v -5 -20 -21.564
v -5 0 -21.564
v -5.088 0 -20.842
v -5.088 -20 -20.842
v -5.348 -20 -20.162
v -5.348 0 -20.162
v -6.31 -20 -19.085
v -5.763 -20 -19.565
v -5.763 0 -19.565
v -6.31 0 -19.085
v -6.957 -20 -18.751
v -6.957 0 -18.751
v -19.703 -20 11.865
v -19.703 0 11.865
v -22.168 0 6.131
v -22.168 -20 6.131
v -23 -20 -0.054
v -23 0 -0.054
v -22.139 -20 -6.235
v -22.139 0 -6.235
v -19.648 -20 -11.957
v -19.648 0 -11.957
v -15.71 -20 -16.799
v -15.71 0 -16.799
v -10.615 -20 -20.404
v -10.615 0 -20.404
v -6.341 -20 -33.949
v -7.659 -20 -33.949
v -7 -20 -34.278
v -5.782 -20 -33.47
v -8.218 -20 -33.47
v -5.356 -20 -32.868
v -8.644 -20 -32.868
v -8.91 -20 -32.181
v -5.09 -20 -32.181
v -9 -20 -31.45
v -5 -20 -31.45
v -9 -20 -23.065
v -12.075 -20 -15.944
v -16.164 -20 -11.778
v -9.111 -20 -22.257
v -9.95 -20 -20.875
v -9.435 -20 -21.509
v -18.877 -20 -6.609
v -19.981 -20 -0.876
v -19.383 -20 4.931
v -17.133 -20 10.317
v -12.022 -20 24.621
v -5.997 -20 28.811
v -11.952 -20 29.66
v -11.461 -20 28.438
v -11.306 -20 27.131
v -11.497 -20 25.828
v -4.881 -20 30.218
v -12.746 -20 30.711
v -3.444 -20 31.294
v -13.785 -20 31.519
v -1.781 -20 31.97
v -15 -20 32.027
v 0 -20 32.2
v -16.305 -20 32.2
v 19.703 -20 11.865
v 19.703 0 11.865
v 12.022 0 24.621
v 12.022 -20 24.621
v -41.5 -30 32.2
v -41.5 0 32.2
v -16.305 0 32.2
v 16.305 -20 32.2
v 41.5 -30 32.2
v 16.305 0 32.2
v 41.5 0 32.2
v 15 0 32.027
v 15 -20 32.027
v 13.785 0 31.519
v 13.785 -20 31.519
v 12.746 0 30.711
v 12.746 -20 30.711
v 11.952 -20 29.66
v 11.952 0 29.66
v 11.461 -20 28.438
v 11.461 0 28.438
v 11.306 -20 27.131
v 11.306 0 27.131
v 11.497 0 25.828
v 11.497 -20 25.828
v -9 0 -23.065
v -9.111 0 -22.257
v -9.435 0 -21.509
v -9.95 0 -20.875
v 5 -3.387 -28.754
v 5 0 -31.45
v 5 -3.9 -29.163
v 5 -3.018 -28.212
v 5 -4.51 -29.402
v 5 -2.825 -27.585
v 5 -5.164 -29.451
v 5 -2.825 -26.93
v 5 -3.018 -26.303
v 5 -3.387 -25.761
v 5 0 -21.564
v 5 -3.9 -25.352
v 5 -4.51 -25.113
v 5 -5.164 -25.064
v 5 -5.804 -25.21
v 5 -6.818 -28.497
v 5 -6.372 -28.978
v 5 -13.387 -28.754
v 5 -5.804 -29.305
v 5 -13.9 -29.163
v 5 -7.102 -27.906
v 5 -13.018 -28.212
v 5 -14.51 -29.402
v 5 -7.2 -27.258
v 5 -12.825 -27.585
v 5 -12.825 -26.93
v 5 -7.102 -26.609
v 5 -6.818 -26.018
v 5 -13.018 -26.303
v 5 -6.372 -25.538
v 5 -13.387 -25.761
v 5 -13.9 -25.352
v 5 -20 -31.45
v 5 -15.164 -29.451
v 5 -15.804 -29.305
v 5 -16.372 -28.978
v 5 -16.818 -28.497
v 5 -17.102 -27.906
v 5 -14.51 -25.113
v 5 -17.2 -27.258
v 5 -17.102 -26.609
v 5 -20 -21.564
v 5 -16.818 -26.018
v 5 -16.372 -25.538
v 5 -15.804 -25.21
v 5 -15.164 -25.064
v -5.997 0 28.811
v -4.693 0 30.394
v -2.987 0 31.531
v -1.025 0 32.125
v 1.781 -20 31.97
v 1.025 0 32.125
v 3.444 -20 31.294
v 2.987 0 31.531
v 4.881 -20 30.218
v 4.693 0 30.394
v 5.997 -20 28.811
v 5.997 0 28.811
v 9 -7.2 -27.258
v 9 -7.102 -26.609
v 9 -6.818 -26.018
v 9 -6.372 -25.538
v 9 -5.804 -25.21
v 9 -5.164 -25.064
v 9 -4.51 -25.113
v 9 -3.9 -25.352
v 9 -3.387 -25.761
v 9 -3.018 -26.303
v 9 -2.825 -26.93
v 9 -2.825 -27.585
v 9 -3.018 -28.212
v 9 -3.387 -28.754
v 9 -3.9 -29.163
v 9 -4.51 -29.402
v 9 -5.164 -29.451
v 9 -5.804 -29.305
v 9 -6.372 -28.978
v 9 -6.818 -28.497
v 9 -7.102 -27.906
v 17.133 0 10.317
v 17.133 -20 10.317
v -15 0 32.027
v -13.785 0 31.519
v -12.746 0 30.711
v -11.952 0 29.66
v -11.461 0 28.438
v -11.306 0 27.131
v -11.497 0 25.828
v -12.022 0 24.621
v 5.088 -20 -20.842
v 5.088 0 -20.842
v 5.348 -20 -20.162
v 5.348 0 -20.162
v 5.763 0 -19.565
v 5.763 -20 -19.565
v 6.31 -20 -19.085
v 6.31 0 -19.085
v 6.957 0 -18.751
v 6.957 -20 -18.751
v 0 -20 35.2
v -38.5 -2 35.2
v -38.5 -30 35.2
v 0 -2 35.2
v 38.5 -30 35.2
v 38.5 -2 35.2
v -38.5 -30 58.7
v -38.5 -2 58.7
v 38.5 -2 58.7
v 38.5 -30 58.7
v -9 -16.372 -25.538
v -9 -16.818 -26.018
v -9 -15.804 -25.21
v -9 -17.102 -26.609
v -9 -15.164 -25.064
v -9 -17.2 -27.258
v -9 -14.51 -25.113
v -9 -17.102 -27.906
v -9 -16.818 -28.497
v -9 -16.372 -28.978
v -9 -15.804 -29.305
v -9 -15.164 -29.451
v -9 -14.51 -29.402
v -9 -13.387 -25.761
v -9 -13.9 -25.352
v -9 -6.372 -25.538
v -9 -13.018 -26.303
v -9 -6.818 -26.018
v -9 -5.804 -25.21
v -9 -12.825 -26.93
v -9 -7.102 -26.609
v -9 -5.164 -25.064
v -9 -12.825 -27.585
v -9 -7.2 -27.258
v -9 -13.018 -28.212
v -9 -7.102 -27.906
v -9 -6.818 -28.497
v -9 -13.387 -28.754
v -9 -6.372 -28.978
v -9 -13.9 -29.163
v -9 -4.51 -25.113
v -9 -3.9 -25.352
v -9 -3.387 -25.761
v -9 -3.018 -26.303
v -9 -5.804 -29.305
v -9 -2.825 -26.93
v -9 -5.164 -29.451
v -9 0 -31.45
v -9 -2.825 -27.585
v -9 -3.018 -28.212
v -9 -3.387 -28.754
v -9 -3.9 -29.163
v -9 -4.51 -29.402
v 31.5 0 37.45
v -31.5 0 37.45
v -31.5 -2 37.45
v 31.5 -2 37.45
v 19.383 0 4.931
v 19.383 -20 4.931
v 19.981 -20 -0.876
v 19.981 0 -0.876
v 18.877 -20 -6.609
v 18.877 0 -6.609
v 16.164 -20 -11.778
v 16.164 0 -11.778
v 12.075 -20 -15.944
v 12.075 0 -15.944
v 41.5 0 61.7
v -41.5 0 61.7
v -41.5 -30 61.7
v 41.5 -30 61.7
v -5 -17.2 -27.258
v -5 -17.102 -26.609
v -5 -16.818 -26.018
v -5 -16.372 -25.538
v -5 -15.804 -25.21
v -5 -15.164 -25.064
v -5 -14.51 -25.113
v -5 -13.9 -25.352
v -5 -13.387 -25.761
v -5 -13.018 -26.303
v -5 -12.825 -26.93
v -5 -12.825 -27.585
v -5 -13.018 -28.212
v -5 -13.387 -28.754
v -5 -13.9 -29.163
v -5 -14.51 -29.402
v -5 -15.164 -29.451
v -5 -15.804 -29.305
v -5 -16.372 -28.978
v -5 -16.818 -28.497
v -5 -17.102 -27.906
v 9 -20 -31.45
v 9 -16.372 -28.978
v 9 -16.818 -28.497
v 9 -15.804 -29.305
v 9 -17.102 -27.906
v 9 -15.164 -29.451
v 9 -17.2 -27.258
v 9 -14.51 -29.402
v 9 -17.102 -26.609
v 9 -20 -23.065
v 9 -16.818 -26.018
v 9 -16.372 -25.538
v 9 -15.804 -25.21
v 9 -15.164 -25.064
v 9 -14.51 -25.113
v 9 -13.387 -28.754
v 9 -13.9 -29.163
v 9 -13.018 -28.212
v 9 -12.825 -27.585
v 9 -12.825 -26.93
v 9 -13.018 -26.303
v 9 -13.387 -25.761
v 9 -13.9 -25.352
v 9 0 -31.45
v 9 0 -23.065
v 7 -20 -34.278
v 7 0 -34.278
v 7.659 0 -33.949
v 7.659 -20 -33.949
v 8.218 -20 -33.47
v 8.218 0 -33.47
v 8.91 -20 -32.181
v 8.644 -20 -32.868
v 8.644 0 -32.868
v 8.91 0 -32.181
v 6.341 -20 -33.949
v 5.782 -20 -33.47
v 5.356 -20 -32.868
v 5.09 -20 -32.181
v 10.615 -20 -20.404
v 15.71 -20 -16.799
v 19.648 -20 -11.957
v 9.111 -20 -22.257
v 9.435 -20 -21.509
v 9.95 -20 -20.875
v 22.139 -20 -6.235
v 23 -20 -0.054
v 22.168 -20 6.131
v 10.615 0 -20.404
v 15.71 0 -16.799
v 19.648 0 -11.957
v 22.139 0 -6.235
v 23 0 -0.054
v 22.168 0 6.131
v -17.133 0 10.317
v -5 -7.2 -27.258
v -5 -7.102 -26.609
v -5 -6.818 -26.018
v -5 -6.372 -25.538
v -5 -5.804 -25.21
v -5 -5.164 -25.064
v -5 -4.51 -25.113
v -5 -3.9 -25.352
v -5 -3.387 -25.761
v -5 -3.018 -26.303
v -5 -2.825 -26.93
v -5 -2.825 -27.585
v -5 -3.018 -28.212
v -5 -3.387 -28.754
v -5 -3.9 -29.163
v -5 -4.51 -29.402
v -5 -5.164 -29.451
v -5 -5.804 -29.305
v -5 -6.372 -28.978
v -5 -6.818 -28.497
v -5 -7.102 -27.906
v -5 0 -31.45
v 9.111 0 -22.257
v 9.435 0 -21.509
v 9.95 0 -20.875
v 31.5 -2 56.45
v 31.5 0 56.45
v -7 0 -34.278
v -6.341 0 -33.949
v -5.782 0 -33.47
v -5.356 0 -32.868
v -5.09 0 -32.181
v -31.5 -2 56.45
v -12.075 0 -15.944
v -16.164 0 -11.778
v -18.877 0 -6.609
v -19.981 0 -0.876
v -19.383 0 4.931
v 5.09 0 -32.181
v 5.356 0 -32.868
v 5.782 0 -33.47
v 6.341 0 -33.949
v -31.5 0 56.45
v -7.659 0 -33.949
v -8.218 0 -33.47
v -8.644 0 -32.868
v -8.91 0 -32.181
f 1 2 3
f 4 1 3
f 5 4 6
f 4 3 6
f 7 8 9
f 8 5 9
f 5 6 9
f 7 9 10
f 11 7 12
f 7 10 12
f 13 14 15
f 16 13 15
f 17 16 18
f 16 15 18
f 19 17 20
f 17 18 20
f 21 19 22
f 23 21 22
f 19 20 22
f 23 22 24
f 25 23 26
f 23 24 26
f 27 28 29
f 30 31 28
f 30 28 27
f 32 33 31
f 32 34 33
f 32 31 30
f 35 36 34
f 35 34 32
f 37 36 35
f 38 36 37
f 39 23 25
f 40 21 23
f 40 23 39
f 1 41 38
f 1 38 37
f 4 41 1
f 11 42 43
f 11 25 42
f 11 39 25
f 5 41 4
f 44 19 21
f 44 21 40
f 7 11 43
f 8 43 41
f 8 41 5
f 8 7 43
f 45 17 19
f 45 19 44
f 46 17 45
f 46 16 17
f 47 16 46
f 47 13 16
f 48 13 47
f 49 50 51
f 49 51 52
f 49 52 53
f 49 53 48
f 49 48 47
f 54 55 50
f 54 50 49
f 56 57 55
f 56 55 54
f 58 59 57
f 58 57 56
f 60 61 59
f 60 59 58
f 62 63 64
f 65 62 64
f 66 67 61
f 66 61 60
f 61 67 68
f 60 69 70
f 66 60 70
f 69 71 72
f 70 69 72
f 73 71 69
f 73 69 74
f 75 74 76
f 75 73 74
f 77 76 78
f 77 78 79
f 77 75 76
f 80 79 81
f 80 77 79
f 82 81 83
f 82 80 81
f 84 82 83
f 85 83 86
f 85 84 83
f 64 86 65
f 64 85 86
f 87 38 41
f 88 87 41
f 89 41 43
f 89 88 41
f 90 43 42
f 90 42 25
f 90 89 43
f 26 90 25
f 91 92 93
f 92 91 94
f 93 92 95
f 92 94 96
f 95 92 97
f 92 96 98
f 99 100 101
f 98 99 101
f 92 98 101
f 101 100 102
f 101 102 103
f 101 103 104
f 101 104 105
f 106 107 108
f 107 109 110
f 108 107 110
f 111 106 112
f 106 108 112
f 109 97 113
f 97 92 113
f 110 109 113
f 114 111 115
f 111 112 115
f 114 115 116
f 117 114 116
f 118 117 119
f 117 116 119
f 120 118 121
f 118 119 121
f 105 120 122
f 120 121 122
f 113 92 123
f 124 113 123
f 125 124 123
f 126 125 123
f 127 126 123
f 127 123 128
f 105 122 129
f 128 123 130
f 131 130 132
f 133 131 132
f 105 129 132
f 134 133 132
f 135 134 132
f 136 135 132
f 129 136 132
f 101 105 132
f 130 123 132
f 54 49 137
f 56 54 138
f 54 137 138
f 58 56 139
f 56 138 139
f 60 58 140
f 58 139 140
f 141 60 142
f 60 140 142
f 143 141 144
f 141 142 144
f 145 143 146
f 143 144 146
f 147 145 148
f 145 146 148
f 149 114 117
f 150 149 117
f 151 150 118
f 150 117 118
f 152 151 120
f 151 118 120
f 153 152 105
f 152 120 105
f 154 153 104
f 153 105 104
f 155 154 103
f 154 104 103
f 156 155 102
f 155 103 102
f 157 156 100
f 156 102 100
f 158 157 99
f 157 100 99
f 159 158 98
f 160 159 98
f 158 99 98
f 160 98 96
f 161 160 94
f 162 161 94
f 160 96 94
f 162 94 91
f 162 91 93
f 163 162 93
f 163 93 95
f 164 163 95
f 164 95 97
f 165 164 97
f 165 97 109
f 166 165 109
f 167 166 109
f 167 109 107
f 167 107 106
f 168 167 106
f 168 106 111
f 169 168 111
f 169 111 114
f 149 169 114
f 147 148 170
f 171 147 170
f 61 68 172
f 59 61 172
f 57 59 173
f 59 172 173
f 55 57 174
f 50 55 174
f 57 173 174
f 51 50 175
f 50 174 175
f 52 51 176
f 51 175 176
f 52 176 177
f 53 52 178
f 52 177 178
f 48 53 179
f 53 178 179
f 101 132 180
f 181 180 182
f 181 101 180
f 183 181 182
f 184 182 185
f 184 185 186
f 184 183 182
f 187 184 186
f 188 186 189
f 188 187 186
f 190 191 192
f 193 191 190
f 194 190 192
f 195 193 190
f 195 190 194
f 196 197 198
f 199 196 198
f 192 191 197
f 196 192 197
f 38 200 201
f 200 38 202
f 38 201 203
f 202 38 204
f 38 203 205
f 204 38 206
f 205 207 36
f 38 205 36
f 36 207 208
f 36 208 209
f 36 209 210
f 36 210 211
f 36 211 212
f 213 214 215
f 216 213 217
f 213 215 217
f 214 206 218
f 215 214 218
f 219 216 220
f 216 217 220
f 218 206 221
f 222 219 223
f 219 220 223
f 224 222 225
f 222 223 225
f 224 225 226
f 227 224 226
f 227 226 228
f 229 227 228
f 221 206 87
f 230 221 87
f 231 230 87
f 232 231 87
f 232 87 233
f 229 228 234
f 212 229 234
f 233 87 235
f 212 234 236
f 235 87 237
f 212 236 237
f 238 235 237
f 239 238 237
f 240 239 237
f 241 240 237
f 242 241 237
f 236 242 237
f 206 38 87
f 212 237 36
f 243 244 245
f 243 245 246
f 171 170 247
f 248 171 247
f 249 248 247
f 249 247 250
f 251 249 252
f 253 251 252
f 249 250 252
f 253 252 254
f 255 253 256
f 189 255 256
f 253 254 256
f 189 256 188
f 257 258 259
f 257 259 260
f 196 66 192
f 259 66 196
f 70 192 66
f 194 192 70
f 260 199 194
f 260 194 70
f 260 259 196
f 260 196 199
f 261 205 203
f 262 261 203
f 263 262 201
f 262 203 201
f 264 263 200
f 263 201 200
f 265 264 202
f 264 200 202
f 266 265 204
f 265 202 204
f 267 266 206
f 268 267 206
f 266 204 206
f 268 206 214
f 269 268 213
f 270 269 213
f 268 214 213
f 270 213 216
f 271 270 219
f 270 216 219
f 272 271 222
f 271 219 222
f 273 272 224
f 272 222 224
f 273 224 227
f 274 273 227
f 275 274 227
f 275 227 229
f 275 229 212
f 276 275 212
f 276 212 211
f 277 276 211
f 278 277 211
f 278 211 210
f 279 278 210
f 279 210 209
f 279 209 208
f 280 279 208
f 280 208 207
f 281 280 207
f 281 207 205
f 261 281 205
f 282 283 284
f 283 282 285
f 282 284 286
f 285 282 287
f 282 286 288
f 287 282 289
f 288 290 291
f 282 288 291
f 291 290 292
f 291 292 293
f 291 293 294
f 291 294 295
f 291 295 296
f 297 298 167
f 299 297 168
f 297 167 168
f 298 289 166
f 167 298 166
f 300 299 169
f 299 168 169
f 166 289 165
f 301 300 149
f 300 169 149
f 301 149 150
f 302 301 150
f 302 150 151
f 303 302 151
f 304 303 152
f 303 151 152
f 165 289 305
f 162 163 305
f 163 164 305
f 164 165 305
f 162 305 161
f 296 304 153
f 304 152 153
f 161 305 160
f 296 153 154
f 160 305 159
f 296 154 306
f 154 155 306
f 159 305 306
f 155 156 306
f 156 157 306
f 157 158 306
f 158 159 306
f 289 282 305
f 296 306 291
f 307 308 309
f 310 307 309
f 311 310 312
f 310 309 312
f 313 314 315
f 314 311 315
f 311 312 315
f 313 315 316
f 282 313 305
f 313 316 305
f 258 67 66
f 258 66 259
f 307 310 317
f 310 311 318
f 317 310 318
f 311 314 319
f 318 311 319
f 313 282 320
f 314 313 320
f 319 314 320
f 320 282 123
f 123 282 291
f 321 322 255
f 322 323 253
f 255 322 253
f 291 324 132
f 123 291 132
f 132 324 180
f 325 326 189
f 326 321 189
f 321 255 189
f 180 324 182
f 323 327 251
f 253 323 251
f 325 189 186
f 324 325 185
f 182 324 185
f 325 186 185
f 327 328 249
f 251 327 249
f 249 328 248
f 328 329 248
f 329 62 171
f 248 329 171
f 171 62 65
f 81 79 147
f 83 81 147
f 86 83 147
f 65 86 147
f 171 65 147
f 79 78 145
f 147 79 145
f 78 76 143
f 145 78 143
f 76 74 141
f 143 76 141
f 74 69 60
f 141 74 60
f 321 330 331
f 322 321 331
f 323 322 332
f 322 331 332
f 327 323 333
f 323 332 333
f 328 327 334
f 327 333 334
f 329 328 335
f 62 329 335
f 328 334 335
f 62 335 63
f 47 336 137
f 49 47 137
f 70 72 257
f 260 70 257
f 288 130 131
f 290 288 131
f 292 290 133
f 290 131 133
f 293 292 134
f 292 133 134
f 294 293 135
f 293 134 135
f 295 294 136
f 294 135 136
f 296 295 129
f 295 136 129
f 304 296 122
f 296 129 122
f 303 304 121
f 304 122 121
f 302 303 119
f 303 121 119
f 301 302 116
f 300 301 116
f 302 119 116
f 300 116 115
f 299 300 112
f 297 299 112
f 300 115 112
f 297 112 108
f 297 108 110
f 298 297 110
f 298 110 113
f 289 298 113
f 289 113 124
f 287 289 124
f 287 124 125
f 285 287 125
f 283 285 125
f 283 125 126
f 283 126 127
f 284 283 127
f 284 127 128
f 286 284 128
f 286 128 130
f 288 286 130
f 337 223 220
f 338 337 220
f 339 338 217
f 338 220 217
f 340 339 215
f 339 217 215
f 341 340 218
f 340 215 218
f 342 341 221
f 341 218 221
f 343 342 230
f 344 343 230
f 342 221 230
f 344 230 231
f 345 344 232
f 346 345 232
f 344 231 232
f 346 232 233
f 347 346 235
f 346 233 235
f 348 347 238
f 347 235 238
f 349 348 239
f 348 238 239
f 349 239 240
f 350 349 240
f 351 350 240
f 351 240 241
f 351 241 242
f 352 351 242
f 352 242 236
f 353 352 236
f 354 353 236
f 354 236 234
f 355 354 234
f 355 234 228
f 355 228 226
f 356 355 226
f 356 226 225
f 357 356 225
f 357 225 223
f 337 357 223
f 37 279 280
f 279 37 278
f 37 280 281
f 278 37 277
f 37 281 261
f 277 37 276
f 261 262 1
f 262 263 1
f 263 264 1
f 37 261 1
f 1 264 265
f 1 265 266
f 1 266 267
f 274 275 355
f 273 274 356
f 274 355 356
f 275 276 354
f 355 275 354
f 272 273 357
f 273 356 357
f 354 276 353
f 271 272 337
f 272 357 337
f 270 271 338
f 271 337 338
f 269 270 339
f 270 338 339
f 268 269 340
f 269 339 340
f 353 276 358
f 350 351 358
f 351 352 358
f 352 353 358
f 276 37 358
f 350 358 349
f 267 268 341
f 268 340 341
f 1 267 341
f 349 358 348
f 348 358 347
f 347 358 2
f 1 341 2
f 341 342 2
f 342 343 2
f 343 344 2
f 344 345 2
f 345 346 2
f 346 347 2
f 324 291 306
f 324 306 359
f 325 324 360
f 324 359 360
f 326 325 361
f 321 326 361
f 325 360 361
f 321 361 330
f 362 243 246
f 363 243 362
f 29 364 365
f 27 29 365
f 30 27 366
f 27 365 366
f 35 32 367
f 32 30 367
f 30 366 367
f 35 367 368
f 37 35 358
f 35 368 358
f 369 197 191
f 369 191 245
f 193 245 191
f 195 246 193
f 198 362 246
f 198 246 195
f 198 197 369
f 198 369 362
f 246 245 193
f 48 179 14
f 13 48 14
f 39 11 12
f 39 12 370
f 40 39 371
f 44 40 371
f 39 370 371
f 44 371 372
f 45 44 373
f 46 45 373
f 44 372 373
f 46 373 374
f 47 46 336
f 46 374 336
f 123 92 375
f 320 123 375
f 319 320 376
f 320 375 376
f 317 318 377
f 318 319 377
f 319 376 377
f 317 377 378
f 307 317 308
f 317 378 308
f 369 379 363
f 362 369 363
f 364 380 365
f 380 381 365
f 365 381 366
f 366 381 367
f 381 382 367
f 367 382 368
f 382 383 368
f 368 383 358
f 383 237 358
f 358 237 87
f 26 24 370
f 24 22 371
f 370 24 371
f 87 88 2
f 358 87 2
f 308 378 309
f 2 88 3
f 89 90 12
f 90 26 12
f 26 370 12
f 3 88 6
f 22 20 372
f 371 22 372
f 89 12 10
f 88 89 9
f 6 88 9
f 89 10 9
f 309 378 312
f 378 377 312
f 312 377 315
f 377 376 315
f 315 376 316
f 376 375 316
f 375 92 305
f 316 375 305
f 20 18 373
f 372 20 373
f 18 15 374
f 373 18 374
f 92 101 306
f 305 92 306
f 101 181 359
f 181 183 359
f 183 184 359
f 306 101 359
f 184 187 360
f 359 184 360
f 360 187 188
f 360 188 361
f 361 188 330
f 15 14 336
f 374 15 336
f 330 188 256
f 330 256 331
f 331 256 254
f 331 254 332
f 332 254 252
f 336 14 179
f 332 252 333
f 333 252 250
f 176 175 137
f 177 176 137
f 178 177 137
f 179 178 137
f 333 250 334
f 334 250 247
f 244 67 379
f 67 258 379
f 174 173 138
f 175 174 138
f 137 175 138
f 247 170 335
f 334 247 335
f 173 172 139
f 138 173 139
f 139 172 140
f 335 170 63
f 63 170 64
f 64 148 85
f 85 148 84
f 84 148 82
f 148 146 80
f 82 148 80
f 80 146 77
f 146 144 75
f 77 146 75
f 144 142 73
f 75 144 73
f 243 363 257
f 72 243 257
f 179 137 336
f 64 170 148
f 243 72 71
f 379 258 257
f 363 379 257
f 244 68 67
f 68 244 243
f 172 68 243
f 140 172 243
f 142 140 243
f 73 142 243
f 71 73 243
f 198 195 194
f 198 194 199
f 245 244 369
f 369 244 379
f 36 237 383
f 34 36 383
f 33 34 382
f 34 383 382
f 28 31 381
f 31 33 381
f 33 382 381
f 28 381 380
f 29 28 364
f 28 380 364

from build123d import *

# Parameters (mm, degrees)
F1_DEPTH    = 20
F3_DEPTH    = 20.001
F5_DEPTH    = 20
F6_T1_DEPTH = 20
F6_T3_DEPTH = 30.9947096091
F6_T5_DEPTH = 35
F7_W        = 83
F7_H        = 29.5
F7_W_2      = 77
F7_H_2      = 23.5
F8_DEPTH    = 30
F9_T1_DEPTH = 20
F10_R       = 2.2
F11_DEPTH   = 50.501
F12_W       = 77
F12_H       = 23.5
F12_W_2     = 63
F12_H_2     = 19
F13_DEPTH   = 2


# Not quite as in the source:
# - a fillet or chamfer that OpenCascade refuses, or shapes differently, is made with other operations: its cross-section is extruded or revolved along the edge and cut away or added


with BuildPart() as f1:
    # F0 (on Front) → F1 (new body)
    with BuildSketch(Plane.XZ):
        with BuildLine():
            ThreePointArc((8.5666506378, 30.3587301587), (0, 35.2), (-8.5666506378, 30.3587301587))
            Line((-8.5666506378, 30.3587301587), (-19.7032964668, 11.8650793651))
            ThreePointArc((-19.7032964668, 11.8650793651), (0, -23), (19.7032964668, 11.8650793651))
            Line((19.7032964668, 11.8650793651), (8.5666506378, 30.3587301587))
        make_face()
        with BuildLine():
            ThreePointArc((17.1333012755, 10.3174603175), (0, -20), (-17.1333012755, 10.3174603175))
            Line((-17.1333012755, 10.3174603175), (-5.9966554464, 28.8111111111))
            ThreePointArc((-5.9966554464, 28.8111111111), (0, 32.2), (5.9966554464, 28.8111111111))
            Line((5.9966554464, 28.8111111111), (17.1333012755, 10.3174603175))
        make_face(mode=Mode.SUBTRACT)
    extrude(amount=F1_DEPTH)

    # F2 (on face) → F3 (cut, through all)
    with BuildSketch(Plane.XZ.offset(20)):
        with BuildLine():
            ThreePointArc((5, -19.364916731), (0, -20), (-5, -19.364916731))
            Line((-5, -19.364916731), (-5, -22.4499443206))
            ThreePointArc((-5, -22.4499443206), (0, -23), (5, -22.4499443206))
            Line((5, -22.4499443206), (5, -19.364916731))
        make_face()
    extrude(amount=-F3_DEPTH, mode=Mode.SUBTRACT)

    # F4 (on Front) → F5 (join, through all)
    with BuildSketch(Plane.XZ):
        Polygon((-5, -34.4499443206), (-5, -22.4499443206), (-9, -21.1660104885), (-9, -34.4499443206), align=None)
        Polygon((5, -34.4499443206), (9, -34.4499443206), (9, -21.1660104885), (5, -22.4499443206), align=None)
    extrude(amount=F5_DEPTH)

    # F6: fillet of radius 3 on 8 edges, made by hand

    # F6_s2 → F6_t1 (join)
    with BuildSketch(Plane.XZ):
        with BuildLine():
            ThreePointArc((-9, -23.0651251893), (-9.4354487572, -21.5085016244), (-10.6153846154, -20.4037645906))
            ThreePointArc((-10.6153846154, -20.4037645906), (-9.8150946559, -20.8005749174), (-9, -21.1660104885))
            Line((-9, -21.1660104885), (-9, -23.0651251893))
        make_face()
        with BuildLine():
            ThreePointArc((9, -23.0651251893), (9.4354487572, -21.5085016244), (10.6153846154, -20.4037645906))
            ThreePointArc((10.6153846154, -20.4037645906), (9.8150946559, -20.8005749174), (9, -21.1660104885))
            Line((9, -21.1660104885), (9, -23.0651251893))
        make_face()
    extrude(amount=F6_T1_DEPTH)

    # F6_s4 → F6_t3 (cut)
    with BuildSketch(Plane.XZ.offset(-5.4973548045)):
        with BuildLine():
            ThreePointArc((-5, -21.5638586528), (-5.5372337928, -19.8507379307), (-6.9565217391, -18.7511814373))
            ThreePointArc((-6.9565217391, -18.7511814373), (-5.9861315369, -19.0831399204), (-5, -19.364916731))
            Line((-5, -19.364916731), (-5, -21.5638586528))
        make_face()
        with BuildLine():
            ThreePointArc((5, -21.5638586528), (5.5372337928, -19.8507379307), (6.9565217391, -18.7511814373))
            ThreePointArc((6.9565217391, -18.7511814373), (5.9861315369, -19.0831399204), (5, -19.364916731))
            Line((5, -19.364916731), (5, -21.5638586528))
        make_face()
    extrude(amount=F6_T3_DEPTH, mode=Mode.SUBTRACT)

    # F6_s6 → F6_t5 (cut)
    with BuildSketch(Plane.XZ.offset(-7.5)):
        with BuildLine():
            ThreePointArc((-8, -34.4499443206), (-5.8786796564, -33.5712646642), (-5, -31.4499443206))
            Line((-5, -31.4499443206), (-5, -34.4499443206))
            Line((-5, -34.4499443206), (-8, -34.4499443206))
        make_face()
        with BuildLine():
            ThreePointArc((5, -31.4499443206), (5.8786796564, -33.5712646642), (8, -34.4499443206))
            Line((8, -34.4499443206), (5, -34.4499443206))
            Line((5, -34.4499443206), (5, -31.4499443206))
        make_face()
        with BuildLine():
            ThreePointArc((6, -34.4499443206), (8.1213203436, -33.5712646642), (9, -31.4499443206))
            Line((9, -31.4499443206), (9, -34.4499443206))
            Line((9, -34.4499443206), (6, -34.4499443206))
        make_face()
        with BuildLine():
            ThreePointArc((-9, -31.4499443206), (-8.1213203436, -33.5712646642), (-6, -34.4499443206))
            Line((-6, -34.4499443206), (-9, -34.4499443206))
            Line((-9, -34.4499443206), (-9, -31.4499443206))
        make_face()
    extrude(amount=F6_T5_DEPTH, mode=Mode.SUBTRACT)

    # F7 (on Front) → F8 (join)
    with BuildSketch(Plane.XZ):
        with Locations((0, 46.95)):
            Rectangle(F7_W, F7_H)
        with Locations((0, 46.95)):
            Rectangle(F7_W_2, F7_H_2, mode=Mode.SUBTRACT)
    extrude(amount=F8_DEPTH)

    # F9: fillet of radius 5 on 2 edges, made by hand

    # F9_s2 → F9_t1 (join)
    with BuildSketch(Plane.XZ):
        with BuildLine():
            ThreePointArc((-16.3053853354, 32.2), (-11.9524078833, 29.659997419), (-12.0220600165, 24.6206349206))
            Line((-12.0220600165, 24.6206349206), (-11.5937274846, 24.3626984127))
            ThreePointArc((-11.5937274846, 24.3626984127), (-8.1383181059, 30.1007936508), (-6.7843570071, 31.85))
            Line((-6.7843570071, 31.85), (-7.1414284285, 32.7))
            Line((-7.1414284285, 32.7), (-16.3053853354, 32.7))
            Line((-16.3053853354, 32.7), (-16.3053853354, 32.2))
        make_face()
        with BuildLine():
            ThreePointArc((16.3053853354, 32.2), (11.9524078833, 29.659997419), (12.0220600165, 24.6206349206))
            Line((12.0220600165, 24.6206349206), (11.5937274846, 24.3626984127))
            ThreePointArc((11.5937274846, 24.3626984127), (8.1383181059, 30.1007936508), (6.7843570071, 31.85))
            Line((6.7843570071, 31.85), (7.1414284285, 32.7))
            Line((7.1414284285, 32.7), (16.3053853354, 32.7))
            Line((16.3053853354, 32.7), (16.3053853354, 32.2))
        make_face()
    extrude(amount=F9_T1_DEPTH)

    # F10 (on face) → F11 (cut, through all)
    with BuildSketch(Plane(origin=(-9, 0, 0), x_dir=(0, -1, 0), z_dir=(-1, 0, 0))):
        with Locations((5, -27.257534755)):
            Circle(F10_R)
        with Locations((15, -27.257534755)):
            Circle(F10_R)
    extrude(amount=-F11_DEPTH, mode=Mode.SUBTRACT)

    # F12 (on Front) → F13 (join)
    with BuildSketch(Plane.XZ):
        with Locations((0, 46.95)):
            Rectangle(F12_W, F12_H)
        with Locations((0, 46.95)):
            Rectangle(F12_W_2, F12_H_2, mode=Mode.SUBTRACT)
    extrude(amount=F13_DEPTH)


solid = f1.part
